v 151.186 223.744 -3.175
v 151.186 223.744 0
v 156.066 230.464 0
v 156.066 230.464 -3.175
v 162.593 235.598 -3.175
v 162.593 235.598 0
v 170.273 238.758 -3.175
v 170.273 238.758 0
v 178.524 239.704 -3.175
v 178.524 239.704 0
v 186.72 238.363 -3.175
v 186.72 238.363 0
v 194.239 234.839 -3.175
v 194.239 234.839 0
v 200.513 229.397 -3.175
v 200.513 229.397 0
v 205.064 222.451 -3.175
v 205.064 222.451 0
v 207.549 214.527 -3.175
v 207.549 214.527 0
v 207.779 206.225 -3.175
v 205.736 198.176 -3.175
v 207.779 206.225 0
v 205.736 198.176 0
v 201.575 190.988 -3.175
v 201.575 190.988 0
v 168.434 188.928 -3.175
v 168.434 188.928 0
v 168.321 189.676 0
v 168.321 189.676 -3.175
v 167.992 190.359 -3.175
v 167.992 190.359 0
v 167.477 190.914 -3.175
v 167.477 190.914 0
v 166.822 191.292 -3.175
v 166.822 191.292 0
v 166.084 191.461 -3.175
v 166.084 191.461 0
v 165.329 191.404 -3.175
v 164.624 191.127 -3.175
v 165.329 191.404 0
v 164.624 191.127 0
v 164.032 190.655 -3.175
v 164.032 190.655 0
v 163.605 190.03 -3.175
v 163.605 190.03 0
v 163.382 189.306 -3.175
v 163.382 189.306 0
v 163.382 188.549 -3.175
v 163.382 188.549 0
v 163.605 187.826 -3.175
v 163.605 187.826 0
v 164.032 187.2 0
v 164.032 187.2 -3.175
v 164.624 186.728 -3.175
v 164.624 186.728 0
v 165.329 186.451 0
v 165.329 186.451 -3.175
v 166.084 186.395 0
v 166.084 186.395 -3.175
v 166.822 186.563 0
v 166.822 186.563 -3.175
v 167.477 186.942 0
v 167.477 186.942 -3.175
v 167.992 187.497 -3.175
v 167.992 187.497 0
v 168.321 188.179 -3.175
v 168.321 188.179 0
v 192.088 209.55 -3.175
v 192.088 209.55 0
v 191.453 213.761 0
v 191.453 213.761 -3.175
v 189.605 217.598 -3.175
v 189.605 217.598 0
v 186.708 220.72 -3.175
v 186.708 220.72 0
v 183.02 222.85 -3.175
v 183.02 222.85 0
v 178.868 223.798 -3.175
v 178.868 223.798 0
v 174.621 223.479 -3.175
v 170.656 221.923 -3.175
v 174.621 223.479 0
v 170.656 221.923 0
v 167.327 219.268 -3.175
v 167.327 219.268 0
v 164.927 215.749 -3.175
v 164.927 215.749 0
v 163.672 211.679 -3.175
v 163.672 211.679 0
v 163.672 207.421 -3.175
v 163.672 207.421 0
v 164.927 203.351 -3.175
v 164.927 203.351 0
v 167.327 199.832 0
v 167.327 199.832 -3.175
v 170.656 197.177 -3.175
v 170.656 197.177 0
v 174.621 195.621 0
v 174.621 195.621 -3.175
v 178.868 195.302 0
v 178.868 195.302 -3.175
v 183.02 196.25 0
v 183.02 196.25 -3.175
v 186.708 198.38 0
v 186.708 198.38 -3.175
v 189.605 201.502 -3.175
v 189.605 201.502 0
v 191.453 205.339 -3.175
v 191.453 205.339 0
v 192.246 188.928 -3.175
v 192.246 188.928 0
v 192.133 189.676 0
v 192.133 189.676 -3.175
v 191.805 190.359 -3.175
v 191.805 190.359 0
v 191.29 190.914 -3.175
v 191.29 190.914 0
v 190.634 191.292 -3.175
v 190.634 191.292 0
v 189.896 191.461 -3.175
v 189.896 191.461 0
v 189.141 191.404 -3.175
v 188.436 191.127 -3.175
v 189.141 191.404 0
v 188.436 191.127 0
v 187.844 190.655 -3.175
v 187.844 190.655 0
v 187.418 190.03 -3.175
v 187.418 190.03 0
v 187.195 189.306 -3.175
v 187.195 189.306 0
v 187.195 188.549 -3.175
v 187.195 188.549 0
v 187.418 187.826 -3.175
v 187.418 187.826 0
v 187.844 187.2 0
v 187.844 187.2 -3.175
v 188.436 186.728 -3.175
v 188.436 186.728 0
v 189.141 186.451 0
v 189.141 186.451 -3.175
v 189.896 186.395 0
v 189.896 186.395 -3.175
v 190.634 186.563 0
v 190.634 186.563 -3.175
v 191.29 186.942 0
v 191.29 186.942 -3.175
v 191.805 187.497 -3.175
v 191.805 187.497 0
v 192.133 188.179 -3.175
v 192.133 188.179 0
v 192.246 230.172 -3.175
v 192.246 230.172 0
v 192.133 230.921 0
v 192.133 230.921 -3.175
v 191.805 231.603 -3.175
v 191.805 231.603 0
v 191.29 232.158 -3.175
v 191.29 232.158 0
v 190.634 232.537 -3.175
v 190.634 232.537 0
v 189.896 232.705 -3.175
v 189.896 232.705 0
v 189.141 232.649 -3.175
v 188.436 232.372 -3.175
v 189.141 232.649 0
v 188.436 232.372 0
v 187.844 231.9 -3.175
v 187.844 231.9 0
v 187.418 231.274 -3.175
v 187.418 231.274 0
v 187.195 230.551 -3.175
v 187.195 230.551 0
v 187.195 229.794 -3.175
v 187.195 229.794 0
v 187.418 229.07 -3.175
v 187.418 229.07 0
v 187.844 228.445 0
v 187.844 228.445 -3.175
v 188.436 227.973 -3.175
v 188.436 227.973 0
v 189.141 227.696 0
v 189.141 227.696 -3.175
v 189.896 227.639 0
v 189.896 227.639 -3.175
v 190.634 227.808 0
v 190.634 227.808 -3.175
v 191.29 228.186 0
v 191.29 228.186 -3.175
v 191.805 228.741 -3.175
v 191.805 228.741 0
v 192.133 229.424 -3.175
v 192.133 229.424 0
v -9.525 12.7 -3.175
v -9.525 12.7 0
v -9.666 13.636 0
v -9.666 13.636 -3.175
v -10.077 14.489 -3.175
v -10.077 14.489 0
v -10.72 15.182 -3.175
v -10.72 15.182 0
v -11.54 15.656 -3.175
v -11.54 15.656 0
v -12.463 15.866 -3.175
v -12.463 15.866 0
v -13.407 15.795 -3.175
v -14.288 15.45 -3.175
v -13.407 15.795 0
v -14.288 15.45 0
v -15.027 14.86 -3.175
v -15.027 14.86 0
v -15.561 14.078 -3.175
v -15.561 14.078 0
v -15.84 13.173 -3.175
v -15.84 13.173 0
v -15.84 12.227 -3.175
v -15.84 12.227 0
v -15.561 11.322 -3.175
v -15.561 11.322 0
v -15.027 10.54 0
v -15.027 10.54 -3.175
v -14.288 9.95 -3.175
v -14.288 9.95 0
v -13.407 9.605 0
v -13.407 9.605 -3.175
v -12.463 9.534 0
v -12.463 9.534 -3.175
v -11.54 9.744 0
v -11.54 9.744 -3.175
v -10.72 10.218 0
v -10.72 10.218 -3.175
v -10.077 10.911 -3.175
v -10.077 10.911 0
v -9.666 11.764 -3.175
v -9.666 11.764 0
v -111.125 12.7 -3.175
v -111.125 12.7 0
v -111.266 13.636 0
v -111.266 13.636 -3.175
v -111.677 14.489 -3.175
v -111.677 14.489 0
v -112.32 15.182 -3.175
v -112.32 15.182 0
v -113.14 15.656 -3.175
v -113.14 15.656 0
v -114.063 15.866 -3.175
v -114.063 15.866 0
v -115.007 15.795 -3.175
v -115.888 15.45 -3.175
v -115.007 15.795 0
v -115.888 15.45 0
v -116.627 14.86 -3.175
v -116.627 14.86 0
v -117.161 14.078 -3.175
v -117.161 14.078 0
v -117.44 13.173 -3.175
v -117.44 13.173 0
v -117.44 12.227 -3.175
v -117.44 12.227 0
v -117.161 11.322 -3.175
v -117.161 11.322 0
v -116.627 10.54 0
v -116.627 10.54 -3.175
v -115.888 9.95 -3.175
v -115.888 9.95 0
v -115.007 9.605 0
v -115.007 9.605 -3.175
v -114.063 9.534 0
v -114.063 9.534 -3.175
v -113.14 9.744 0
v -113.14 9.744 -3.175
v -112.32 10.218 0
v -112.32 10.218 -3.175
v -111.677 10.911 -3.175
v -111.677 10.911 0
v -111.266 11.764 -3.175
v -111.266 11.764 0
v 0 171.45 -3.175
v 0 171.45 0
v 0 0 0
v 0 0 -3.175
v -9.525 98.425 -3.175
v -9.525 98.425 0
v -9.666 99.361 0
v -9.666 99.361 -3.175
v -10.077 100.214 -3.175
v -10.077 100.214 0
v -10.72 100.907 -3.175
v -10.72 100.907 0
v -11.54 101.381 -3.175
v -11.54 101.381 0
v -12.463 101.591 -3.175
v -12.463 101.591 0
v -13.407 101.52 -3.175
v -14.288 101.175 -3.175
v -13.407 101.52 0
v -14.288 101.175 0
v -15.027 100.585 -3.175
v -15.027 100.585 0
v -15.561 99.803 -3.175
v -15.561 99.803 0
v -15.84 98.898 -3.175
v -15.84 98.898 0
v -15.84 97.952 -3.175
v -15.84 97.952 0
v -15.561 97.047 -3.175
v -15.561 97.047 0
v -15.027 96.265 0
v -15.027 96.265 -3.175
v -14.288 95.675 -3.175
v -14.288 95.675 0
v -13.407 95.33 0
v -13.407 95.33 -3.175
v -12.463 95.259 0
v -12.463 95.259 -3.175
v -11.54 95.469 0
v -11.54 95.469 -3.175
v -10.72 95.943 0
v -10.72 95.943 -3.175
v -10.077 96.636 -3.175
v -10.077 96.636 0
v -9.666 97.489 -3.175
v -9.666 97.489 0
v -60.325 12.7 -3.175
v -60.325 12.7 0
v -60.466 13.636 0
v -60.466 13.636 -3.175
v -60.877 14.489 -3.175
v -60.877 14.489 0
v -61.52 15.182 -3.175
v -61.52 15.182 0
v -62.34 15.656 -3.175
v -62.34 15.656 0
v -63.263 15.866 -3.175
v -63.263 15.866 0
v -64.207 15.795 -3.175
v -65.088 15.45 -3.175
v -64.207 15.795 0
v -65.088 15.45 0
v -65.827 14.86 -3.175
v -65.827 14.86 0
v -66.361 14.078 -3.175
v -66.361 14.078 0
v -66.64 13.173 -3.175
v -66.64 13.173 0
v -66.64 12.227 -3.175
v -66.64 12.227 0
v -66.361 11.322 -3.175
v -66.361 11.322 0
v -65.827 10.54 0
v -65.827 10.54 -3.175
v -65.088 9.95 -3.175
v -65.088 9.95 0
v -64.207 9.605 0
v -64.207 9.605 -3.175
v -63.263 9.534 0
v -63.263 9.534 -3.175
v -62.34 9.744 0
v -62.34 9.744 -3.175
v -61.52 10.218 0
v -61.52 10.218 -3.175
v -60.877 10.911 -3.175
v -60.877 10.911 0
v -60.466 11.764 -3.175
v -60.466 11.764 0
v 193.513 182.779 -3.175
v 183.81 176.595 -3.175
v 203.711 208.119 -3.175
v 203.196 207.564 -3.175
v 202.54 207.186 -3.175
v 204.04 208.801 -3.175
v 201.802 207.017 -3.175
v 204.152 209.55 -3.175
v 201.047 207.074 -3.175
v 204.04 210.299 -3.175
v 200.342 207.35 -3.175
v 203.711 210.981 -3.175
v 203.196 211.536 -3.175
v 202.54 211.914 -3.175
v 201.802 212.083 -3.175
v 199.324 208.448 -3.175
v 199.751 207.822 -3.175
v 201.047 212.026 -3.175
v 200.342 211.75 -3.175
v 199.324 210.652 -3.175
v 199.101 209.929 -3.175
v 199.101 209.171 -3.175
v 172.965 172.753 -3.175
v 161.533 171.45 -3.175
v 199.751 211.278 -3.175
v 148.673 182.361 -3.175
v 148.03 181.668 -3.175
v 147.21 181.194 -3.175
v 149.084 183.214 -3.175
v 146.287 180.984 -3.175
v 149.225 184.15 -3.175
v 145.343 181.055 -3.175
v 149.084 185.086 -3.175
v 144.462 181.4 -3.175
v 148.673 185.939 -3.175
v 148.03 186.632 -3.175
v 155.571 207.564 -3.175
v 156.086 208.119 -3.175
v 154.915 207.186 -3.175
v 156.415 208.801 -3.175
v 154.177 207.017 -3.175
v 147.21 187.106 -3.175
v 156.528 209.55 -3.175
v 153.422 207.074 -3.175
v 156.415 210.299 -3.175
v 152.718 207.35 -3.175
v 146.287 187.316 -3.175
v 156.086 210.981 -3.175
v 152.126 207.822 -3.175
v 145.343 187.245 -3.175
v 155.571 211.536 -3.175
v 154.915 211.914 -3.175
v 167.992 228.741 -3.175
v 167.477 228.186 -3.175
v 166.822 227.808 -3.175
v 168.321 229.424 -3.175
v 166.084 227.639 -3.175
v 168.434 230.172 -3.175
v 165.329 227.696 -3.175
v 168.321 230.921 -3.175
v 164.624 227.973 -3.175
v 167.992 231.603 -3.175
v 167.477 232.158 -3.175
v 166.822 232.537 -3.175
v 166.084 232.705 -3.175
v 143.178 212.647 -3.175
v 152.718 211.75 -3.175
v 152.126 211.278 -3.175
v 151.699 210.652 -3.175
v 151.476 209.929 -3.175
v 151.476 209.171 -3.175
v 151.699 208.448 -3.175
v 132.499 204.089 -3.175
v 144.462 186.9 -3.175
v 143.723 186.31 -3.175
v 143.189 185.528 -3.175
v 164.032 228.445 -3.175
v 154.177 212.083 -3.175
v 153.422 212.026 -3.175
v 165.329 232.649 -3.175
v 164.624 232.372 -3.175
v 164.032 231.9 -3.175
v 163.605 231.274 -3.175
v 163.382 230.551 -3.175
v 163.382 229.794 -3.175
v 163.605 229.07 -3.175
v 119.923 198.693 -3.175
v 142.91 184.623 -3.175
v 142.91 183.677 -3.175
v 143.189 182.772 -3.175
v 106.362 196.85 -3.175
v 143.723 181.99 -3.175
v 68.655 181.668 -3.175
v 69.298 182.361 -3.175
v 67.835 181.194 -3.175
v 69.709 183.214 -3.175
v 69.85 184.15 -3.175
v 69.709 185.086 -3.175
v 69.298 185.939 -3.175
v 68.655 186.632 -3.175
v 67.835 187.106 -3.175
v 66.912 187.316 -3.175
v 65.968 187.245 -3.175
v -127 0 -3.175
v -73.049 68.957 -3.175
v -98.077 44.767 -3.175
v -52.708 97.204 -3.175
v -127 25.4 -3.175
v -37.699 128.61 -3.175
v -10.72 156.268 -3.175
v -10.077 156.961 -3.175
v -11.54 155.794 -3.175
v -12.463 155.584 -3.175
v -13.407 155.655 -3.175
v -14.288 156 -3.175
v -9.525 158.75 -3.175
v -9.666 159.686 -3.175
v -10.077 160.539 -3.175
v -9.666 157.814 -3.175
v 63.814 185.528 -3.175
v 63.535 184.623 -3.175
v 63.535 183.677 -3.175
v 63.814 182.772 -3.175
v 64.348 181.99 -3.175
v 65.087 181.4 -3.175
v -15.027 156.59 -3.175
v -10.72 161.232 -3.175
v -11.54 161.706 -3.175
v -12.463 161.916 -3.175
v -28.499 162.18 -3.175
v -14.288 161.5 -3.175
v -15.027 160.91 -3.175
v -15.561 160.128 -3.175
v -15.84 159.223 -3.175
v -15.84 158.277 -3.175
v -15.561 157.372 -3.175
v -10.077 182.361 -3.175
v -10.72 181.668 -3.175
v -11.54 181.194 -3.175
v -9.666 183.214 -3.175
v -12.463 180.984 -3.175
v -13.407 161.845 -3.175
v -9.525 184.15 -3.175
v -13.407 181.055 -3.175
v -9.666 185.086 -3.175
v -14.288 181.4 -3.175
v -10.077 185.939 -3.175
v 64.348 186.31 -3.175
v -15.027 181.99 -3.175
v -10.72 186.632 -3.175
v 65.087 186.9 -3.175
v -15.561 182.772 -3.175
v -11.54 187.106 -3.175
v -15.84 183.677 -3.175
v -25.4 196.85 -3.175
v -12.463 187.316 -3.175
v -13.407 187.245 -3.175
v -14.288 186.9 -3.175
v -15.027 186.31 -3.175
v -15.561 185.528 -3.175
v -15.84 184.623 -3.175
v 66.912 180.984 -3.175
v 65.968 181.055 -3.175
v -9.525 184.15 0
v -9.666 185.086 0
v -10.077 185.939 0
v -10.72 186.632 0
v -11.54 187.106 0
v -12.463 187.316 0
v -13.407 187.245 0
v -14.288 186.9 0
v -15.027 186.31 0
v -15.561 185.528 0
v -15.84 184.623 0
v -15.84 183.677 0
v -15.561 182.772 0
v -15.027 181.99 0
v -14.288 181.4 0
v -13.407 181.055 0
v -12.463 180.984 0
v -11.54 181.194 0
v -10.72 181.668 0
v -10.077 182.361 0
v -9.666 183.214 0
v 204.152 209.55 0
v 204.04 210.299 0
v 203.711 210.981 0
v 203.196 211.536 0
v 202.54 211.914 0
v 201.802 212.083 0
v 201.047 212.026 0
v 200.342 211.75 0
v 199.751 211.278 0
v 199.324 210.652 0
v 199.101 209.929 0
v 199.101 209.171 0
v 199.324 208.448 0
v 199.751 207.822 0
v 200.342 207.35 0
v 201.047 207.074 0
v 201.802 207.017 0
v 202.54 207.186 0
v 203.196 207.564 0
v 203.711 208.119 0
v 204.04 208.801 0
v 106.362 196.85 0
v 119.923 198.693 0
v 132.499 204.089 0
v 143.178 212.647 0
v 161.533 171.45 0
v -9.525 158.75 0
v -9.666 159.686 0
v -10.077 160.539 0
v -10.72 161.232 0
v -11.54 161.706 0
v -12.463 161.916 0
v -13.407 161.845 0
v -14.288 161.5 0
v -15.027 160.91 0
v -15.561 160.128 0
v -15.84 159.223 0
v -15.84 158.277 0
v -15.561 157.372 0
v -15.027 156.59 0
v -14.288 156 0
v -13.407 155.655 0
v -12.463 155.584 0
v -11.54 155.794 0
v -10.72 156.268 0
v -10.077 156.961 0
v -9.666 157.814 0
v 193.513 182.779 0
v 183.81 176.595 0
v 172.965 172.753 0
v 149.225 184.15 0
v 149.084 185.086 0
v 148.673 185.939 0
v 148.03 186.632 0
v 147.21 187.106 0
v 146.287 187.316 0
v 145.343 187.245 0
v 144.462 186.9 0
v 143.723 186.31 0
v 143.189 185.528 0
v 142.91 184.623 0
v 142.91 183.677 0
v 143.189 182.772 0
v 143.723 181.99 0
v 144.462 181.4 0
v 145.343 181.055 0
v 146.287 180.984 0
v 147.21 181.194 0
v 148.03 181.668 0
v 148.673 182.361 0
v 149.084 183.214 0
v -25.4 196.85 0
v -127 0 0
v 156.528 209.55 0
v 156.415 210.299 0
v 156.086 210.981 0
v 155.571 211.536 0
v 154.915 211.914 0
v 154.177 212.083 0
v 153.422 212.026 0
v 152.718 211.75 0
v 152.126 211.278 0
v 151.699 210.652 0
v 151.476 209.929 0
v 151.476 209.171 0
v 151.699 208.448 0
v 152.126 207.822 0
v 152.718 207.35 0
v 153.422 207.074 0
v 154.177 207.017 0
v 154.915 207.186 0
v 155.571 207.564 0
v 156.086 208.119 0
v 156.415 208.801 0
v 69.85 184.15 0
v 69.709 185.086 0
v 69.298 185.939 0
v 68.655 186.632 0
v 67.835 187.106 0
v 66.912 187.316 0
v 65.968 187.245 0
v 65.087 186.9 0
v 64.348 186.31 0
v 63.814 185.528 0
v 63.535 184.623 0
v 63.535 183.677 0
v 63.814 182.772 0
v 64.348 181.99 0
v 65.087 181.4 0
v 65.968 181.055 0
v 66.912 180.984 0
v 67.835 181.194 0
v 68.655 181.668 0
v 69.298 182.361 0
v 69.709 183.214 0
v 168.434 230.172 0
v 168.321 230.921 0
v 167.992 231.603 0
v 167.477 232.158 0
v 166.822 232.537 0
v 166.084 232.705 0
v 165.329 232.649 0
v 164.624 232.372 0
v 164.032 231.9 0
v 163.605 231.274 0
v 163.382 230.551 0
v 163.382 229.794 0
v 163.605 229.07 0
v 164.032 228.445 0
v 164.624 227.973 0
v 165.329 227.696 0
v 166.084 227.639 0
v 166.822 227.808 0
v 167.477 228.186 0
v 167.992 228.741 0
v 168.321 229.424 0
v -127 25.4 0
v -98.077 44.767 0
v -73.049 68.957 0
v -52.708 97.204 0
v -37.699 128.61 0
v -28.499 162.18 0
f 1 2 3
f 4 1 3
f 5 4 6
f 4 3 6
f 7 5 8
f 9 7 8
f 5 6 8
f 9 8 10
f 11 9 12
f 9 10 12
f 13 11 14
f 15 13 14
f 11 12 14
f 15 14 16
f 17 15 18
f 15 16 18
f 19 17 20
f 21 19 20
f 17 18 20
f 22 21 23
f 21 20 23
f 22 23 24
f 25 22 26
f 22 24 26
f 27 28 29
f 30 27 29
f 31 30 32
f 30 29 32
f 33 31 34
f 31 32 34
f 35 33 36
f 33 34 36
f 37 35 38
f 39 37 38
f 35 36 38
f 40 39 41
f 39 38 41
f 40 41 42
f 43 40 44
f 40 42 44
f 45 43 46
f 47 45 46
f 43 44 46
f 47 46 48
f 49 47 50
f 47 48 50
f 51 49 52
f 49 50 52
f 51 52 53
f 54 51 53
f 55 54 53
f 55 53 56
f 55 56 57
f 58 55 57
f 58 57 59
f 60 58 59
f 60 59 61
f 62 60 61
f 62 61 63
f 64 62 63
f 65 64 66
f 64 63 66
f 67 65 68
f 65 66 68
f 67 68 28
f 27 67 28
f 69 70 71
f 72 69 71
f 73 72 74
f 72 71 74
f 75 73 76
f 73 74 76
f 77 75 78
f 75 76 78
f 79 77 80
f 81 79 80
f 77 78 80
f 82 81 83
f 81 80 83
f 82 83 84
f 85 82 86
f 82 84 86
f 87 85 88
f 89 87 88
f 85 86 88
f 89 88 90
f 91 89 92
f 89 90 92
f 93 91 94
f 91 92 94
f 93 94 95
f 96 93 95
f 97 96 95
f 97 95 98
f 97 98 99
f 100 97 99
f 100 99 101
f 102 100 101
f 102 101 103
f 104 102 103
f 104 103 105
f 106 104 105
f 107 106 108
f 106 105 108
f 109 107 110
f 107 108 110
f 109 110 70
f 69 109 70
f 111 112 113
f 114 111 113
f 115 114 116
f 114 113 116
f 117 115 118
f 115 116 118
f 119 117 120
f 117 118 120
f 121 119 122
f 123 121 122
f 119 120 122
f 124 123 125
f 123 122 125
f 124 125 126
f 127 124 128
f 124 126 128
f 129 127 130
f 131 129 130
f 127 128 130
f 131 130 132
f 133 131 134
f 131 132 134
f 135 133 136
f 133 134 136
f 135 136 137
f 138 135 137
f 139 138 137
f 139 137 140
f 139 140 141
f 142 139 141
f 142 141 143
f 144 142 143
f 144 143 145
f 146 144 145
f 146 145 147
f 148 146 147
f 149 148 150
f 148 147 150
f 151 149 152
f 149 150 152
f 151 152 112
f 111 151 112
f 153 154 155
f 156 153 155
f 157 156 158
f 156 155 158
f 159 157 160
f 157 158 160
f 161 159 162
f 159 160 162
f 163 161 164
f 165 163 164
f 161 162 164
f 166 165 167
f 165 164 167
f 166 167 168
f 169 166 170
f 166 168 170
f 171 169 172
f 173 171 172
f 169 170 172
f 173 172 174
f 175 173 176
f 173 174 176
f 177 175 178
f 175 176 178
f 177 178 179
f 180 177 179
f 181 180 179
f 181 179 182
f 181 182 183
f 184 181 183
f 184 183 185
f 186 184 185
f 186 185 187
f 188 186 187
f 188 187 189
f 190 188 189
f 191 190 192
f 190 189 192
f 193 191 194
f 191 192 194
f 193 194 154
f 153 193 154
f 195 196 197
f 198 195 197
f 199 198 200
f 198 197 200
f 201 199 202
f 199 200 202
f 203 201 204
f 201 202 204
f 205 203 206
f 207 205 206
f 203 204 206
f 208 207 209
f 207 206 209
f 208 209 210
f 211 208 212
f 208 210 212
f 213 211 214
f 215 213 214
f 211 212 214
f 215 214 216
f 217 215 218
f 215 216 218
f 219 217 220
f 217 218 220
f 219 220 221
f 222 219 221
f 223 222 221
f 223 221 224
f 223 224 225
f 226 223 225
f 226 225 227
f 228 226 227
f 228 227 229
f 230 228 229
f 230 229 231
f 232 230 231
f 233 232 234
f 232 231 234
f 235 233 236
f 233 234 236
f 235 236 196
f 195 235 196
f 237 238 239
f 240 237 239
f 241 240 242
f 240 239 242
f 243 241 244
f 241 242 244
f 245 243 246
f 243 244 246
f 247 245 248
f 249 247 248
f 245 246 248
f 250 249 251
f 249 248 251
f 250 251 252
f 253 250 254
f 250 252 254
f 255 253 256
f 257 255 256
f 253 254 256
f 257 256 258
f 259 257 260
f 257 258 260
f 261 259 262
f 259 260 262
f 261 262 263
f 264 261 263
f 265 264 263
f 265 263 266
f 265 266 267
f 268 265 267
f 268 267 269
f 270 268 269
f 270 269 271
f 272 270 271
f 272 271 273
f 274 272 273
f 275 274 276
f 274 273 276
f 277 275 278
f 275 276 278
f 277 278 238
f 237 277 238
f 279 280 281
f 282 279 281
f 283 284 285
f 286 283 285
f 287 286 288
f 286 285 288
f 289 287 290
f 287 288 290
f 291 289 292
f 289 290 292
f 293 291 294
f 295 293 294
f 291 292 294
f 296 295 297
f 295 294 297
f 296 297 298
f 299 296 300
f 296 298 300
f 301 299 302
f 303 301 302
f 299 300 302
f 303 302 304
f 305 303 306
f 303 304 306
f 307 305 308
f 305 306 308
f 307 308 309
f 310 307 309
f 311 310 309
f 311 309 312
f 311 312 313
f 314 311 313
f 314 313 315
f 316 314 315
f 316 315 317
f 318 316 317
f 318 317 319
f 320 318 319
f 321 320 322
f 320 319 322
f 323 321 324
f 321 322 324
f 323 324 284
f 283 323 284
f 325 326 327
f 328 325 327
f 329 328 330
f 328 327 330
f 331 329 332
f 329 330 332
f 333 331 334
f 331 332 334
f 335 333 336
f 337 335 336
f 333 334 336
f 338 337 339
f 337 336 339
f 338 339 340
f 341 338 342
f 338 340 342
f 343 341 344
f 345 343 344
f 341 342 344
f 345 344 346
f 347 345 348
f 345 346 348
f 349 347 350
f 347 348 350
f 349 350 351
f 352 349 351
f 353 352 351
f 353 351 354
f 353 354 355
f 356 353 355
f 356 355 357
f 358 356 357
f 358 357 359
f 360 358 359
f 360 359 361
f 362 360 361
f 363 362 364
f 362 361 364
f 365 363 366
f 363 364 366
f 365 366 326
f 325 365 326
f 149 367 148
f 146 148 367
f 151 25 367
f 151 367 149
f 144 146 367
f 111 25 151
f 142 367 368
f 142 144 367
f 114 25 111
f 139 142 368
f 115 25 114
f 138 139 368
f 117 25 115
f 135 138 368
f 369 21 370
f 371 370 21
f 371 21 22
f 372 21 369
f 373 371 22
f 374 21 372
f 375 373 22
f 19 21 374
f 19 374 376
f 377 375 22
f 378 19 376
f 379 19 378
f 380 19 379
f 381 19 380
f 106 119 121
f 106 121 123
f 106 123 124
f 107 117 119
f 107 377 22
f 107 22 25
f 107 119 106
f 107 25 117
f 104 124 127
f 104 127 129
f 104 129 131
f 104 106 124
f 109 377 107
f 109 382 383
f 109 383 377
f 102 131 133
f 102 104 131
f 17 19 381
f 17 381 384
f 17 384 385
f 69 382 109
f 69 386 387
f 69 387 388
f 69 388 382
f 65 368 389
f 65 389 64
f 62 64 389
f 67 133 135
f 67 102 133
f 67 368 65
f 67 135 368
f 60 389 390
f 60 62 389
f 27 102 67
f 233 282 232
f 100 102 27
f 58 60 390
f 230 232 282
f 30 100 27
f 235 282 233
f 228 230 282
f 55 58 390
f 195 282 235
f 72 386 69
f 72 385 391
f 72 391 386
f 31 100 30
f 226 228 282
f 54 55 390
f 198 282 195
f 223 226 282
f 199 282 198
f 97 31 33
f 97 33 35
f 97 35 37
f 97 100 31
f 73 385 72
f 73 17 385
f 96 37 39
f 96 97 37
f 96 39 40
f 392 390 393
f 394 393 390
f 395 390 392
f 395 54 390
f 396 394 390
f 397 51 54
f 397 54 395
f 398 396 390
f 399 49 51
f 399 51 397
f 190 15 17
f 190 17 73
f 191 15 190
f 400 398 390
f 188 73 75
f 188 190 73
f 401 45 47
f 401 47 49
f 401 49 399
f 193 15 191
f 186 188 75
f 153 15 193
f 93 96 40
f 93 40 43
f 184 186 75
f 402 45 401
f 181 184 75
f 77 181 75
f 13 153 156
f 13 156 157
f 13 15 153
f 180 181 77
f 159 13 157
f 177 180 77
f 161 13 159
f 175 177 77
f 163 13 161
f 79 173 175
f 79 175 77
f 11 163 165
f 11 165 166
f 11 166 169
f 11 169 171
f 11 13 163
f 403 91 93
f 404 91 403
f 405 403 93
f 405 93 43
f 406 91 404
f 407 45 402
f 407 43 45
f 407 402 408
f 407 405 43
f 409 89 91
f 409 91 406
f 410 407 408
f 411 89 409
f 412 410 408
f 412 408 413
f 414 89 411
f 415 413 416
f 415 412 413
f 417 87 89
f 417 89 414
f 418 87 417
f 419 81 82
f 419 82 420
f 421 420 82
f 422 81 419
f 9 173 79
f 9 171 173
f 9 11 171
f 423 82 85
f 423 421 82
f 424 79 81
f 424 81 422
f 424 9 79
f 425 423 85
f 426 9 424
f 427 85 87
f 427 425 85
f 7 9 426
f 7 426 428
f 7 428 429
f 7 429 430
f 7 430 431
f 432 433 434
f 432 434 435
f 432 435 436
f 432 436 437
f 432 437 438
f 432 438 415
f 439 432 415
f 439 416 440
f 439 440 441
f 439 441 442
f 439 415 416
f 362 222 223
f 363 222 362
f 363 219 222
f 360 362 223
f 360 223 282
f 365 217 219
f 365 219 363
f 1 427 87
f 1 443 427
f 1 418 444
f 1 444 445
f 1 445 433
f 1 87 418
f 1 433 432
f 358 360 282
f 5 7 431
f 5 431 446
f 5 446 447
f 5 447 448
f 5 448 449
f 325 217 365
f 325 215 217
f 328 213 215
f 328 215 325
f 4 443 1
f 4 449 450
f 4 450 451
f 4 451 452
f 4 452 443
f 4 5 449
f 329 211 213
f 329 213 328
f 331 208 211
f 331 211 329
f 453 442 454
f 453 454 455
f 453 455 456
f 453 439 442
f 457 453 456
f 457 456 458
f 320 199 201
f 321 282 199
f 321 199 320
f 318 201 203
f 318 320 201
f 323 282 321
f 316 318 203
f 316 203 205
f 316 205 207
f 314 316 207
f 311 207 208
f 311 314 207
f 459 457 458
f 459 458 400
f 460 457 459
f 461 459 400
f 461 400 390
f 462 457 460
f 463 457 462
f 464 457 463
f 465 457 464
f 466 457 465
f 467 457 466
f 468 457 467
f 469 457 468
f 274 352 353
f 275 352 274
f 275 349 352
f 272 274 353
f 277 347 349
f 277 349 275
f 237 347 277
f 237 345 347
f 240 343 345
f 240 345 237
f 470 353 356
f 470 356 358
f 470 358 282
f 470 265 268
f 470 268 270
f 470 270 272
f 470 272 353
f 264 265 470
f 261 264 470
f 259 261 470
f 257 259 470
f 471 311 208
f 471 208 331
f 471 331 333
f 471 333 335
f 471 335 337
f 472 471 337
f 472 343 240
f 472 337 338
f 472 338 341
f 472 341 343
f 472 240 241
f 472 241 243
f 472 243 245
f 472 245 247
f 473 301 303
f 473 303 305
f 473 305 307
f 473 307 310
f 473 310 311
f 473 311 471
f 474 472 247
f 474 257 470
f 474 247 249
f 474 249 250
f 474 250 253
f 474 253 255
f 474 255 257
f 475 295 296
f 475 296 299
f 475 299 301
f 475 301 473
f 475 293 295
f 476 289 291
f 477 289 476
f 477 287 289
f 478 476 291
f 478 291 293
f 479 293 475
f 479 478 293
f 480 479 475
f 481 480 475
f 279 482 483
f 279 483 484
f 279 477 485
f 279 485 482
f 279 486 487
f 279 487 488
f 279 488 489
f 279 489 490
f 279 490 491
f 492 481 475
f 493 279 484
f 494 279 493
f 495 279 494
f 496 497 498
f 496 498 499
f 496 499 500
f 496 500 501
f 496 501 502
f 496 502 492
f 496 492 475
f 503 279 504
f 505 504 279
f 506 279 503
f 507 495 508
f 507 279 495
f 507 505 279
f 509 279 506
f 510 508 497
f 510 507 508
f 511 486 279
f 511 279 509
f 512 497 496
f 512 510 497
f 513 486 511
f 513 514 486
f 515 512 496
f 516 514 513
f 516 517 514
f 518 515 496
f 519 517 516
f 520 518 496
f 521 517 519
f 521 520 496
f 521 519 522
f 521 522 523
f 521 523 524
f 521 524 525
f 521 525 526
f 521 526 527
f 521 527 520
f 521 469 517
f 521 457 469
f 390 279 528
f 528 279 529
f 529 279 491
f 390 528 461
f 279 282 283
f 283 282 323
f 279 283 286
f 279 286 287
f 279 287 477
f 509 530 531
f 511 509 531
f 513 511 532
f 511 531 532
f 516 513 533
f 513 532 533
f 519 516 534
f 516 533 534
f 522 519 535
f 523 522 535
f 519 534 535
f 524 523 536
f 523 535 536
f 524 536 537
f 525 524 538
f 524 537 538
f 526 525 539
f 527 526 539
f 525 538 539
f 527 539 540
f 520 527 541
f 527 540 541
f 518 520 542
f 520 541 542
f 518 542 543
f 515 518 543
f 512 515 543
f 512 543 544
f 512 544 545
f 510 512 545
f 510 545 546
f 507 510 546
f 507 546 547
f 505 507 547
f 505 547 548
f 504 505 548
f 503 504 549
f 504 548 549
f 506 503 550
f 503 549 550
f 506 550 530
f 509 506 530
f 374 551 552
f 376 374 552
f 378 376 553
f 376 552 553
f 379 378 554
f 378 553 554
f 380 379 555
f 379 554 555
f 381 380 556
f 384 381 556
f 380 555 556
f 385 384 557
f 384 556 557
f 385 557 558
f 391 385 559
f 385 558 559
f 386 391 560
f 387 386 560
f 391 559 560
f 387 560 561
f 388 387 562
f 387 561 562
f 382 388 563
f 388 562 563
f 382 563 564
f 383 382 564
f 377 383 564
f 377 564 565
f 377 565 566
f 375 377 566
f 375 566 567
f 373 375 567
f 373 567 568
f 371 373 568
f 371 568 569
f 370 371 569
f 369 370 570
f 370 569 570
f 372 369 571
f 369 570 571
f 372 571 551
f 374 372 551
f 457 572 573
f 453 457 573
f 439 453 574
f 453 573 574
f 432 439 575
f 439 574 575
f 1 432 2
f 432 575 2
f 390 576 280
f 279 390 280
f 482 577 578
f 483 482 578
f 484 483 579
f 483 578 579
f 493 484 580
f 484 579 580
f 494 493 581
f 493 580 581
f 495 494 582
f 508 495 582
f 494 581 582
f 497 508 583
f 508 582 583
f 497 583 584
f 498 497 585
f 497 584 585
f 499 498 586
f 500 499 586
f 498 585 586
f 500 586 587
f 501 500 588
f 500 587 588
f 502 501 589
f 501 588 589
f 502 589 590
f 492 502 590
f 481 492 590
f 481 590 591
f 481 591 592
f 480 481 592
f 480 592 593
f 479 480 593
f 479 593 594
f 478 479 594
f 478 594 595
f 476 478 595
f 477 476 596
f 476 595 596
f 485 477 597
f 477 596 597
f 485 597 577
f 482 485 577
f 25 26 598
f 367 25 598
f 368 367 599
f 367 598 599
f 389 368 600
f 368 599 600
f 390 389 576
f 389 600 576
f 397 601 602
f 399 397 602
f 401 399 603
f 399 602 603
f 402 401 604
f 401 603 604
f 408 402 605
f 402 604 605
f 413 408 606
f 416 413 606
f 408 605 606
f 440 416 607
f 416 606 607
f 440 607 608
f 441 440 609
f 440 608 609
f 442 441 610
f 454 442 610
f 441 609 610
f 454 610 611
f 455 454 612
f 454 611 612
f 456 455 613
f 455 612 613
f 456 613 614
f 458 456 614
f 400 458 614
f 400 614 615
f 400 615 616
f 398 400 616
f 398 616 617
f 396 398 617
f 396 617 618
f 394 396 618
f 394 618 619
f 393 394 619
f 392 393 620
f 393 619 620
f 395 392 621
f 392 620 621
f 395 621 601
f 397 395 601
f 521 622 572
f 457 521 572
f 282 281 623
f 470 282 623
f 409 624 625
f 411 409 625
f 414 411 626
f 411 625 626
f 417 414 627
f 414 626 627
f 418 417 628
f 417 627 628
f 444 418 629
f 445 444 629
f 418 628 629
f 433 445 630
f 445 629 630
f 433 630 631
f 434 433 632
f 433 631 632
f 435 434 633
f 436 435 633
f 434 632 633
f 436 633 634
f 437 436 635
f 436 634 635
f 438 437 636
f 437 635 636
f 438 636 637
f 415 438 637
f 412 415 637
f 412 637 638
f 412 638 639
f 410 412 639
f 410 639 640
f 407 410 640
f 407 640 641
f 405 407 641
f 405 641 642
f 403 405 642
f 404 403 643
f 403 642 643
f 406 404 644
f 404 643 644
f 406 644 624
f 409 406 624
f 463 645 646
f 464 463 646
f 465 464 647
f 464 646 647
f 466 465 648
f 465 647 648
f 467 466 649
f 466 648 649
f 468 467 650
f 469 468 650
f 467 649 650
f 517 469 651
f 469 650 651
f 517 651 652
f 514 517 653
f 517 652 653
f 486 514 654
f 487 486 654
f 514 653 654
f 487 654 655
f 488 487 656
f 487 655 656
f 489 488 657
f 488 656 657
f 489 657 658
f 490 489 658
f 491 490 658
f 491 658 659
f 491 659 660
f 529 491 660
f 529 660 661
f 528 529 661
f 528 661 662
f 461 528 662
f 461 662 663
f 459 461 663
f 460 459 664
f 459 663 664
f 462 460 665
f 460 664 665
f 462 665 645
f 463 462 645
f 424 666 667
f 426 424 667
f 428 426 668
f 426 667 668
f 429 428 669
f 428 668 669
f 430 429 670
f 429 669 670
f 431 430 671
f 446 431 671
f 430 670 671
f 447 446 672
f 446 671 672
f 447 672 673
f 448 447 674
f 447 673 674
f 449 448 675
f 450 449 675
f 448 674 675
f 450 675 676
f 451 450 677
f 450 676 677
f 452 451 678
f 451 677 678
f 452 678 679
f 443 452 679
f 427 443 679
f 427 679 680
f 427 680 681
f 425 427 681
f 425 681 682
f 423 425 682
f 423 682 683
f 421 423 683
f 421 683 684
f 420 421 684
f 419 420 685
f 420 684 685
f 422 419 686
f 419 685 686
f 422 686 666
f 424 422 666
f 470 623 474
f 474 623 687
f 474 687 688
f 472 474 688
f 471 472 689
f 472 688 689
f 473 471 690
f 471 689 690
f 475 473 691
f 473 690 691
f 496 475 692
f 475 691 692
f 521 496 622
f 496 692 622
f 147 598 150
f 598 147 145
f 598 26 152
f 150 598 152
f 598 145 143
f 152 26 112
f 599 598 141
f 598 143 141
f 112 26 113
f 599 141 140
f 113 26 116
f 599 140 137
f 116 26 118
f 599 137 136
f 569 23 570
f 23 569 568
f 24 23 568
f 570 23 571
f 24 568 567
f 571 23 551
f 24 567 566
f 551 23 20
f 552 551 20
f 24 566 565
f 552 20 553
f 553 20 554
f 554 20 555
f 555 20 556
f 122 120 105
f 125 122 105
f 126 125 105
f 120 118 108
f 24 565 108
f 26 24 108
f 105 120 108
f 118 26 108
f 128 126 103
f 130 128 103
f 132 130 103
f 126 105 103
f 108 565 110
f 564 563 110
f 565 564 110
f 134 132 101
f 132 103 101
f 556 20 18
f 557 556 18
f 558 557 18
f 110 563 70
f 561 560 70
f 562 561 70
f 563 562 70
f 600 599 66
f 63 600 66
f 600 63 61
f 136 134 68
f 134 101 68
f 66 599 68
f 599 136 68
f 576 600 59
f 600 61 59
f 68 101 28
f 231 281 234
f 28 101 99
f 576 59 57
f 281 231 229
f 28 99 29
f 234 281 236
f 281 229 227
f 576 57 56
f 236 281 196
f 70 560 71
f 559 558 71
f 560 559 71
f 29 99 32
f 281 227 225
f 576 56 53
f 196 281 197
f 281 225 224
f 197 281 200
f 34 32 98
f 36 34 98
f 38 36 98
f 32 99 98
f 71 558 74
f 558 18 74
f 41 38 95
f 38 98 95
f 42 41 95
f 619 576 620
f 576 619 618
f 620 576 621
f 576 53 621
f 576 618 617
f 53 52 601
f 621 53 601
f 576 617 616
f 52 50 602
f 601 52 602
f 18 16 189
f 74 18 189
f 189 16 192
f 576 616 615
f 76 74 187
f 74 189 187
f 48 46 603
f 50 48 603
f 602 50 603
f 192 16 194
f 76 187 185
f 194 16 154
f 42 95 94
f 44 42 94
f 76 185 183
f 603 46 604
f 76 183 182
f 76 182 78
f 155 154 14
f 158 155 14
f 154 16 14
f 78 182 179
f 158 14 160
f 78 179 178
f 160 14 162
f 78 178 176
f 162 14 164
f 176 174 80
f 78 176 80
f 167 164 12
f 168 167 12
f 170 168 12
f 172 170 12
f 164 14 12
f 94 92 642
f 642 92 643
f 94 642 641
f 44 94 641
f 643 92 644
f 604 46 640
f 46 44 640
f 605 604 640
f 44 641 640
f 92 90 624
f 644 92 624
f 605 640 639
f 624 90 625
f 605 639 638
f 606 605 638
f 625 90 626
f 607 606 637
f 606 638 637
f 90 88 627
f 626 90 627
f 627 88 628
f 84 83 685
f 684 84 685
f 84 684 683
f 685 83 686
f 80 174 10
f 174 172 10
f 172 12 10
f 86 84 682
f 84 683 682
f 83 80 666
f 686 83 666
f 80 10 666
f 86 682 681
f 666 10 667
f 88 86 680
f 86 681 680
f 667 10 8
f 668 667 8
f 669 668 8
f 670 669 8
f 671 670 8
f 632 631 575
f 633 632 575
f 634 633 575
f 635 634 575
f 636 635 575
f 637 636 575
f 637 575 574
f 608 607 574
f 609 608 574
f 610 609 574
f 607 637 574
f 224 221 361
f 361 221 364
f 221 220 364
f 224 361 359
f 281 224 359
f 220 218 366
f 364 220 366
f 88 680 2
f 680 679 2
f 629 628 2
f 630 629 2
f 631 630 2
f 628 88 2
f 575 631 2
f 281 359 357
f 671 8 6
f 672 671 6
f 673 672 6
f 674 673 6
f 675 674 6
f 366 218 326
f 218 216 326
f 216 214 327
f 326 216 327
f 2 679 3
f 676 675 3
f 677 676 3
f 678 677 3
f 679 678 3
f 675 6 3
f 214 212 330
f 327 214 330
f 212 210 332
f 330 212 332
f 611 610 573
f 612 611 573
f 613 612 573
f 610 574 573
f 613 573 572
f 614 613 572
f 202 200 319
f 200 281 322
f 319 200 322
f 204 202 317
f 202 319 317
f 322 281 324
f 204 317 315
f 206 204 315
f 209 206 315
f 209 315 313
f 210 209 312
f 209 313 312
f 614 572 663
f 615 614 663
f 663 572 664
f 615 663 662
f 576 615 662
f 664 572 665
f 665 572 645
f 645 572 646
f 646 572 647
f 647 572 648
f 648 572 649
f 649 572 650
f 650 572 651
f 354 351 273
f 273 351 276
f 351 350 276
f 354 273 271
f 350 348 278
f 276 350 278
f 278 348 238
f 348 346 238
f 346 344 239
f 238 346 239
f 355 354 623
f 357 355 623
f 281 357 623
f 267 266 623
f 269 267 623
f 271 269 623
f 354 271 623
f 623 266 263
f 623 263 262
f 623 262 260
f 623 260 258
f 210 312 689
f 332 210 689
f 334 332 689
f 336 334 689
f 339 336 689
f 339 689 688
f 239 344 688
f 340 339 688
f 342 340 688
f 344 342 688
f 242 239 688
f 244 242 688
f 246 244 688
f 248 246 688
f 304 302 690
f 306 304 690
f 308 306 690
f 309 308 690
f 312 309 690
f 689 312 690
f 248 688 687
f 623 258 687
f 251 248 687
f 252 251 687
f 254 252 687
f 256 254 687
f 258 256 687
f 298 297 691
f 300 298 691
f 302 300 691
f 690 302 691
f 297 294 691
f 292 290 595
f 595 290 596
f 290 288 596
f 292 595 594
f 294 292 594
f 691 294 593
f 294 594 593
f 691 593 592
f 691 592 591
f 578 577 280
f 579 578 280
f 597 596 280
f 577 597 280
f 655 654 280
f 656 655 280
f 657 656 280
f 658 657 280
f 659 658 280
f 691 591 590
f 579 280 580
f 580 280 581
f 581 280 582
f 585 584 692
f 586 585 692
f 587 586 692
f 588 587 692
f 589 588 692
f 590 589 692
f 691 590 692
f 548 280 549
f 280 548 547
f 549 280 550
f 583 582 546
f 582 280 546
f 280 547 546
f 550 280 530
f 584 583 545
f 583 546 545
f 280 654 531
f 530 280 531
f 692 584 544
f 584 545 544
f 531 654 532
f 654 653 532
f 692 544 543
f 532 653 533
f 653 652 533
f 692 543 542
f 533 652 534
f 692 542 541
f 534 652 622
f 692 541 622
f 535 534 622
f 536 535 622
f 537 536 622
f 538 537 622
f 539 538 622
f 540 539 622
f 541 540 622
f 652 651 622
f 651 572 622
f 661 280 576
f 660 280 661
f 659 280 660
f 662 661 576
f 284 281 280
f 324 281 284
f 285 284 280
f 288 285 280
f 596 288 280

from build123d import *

# Parameters (mm, degrees)
SKETCH1_R          = 3.175
SKETCH1_R_2        = 14.2875
SKETCH1_R_3        = 2.54
BASE_FLANGE1_DEPTH = 3.175


# Sheet-metal steps are written as plain solids
with BuildPart() as part:
    # Sketch1 → Base-Flange1 (new body)
    with BuildSketch(Plane.XY):
        with BuildLine():
            Line((0, 0), (-127, 0))
            Line((-127, 0), (-127, 25.4))
            ThreePointArc((-127, 25.4), (-52.707547813, 97.203546852), (-25.4, 196.85))
            Line((-25.4, 196.85), (0, 196.85))
            Line((0, 196.85), (106.3625, 196.85))
            ThreePointArc((106.3625, 196.85), (132.498884376, 204.089359374), (151.186029412, 223.744117647))
            ThreePointArc((151.186029412, 223.744117647), (194.239231655, 234.838892203), (201.574896344, 190.988461538))
            ThreePointArc((201.574896344, 190.988461538), (183.810239349, 176.595174659), (161.532965659, 171.45))
            Line((161.532965659, 171.45), (0, 171.45))
            Line((0, 171.45), (0, 0))
        make_face()
        with Locations((-12.7, 12.7)):
            Circle(SKETCH1_R, mode=Mode.SUBTRACT)
        with Locations((-12.7, 184.15)):
            Circle(SKETCH1_R, mode=Mode.SUBTRACT)
        with Locations((-114.3, 12.7)):
            Circle(SKETCH1_R, mode=Mode.SUBTRACT)
        with Locations((-63.5, 12.7)):
            Circle(SKETCH1_R, mode=Mode.SUBTRACT)
        with Locations((-12.7, 98.425)):
            Circle(SKETCH1_R, mode=Mode.SUBTRACT)
        with Locations((177.8, 209.55)):
            Circle(SKETCH1_R_2, mode=Mode.SUBTRACT)
        with Locations((201.6125, 209.55)):
            Circle(SKETCH1_R_3, mode=Mode.SUBTRACT)
        with Locations((189.70625, 188.927770072)):
            Circle(SKETCH1_R_3, mode=Mode.SUBTRACT)
        with Locations((165.89375, 188.927770072)):
            Circle(SKETCH1_R_3, mode=Mode.SUBTRACT)
        with Locations((153.9875, 209.55)):
            Circle(SKETCH1_R_3, mode=Mode.SUBTRACT)
        with Locations((165.89375, 230.172229928)):
            Circle(SKETCH1_R_3, mode=Mode.SUBTRACT)
        with Locations((189.70625, 230.172229928)):
            Circle(SKETCH1_R_3, mode=Mode.SUBTRACT)
        with Locations((66.675, 184.15)):
            Circle(SKETCH1_R, mode=Mode.SUBTRACT)
        with Locations((-12.7, 158.75)):
            Circle(SKETCH1_R, mode=Mode.SUBTRACT)
        with Locations((146.05, 184.15)):
            Circle(SKETCH1_R, mode=Mode.SUBTRACT)
    extrude(amount=-BASE_FLANGE1_DEPTH)


solid = part.part
